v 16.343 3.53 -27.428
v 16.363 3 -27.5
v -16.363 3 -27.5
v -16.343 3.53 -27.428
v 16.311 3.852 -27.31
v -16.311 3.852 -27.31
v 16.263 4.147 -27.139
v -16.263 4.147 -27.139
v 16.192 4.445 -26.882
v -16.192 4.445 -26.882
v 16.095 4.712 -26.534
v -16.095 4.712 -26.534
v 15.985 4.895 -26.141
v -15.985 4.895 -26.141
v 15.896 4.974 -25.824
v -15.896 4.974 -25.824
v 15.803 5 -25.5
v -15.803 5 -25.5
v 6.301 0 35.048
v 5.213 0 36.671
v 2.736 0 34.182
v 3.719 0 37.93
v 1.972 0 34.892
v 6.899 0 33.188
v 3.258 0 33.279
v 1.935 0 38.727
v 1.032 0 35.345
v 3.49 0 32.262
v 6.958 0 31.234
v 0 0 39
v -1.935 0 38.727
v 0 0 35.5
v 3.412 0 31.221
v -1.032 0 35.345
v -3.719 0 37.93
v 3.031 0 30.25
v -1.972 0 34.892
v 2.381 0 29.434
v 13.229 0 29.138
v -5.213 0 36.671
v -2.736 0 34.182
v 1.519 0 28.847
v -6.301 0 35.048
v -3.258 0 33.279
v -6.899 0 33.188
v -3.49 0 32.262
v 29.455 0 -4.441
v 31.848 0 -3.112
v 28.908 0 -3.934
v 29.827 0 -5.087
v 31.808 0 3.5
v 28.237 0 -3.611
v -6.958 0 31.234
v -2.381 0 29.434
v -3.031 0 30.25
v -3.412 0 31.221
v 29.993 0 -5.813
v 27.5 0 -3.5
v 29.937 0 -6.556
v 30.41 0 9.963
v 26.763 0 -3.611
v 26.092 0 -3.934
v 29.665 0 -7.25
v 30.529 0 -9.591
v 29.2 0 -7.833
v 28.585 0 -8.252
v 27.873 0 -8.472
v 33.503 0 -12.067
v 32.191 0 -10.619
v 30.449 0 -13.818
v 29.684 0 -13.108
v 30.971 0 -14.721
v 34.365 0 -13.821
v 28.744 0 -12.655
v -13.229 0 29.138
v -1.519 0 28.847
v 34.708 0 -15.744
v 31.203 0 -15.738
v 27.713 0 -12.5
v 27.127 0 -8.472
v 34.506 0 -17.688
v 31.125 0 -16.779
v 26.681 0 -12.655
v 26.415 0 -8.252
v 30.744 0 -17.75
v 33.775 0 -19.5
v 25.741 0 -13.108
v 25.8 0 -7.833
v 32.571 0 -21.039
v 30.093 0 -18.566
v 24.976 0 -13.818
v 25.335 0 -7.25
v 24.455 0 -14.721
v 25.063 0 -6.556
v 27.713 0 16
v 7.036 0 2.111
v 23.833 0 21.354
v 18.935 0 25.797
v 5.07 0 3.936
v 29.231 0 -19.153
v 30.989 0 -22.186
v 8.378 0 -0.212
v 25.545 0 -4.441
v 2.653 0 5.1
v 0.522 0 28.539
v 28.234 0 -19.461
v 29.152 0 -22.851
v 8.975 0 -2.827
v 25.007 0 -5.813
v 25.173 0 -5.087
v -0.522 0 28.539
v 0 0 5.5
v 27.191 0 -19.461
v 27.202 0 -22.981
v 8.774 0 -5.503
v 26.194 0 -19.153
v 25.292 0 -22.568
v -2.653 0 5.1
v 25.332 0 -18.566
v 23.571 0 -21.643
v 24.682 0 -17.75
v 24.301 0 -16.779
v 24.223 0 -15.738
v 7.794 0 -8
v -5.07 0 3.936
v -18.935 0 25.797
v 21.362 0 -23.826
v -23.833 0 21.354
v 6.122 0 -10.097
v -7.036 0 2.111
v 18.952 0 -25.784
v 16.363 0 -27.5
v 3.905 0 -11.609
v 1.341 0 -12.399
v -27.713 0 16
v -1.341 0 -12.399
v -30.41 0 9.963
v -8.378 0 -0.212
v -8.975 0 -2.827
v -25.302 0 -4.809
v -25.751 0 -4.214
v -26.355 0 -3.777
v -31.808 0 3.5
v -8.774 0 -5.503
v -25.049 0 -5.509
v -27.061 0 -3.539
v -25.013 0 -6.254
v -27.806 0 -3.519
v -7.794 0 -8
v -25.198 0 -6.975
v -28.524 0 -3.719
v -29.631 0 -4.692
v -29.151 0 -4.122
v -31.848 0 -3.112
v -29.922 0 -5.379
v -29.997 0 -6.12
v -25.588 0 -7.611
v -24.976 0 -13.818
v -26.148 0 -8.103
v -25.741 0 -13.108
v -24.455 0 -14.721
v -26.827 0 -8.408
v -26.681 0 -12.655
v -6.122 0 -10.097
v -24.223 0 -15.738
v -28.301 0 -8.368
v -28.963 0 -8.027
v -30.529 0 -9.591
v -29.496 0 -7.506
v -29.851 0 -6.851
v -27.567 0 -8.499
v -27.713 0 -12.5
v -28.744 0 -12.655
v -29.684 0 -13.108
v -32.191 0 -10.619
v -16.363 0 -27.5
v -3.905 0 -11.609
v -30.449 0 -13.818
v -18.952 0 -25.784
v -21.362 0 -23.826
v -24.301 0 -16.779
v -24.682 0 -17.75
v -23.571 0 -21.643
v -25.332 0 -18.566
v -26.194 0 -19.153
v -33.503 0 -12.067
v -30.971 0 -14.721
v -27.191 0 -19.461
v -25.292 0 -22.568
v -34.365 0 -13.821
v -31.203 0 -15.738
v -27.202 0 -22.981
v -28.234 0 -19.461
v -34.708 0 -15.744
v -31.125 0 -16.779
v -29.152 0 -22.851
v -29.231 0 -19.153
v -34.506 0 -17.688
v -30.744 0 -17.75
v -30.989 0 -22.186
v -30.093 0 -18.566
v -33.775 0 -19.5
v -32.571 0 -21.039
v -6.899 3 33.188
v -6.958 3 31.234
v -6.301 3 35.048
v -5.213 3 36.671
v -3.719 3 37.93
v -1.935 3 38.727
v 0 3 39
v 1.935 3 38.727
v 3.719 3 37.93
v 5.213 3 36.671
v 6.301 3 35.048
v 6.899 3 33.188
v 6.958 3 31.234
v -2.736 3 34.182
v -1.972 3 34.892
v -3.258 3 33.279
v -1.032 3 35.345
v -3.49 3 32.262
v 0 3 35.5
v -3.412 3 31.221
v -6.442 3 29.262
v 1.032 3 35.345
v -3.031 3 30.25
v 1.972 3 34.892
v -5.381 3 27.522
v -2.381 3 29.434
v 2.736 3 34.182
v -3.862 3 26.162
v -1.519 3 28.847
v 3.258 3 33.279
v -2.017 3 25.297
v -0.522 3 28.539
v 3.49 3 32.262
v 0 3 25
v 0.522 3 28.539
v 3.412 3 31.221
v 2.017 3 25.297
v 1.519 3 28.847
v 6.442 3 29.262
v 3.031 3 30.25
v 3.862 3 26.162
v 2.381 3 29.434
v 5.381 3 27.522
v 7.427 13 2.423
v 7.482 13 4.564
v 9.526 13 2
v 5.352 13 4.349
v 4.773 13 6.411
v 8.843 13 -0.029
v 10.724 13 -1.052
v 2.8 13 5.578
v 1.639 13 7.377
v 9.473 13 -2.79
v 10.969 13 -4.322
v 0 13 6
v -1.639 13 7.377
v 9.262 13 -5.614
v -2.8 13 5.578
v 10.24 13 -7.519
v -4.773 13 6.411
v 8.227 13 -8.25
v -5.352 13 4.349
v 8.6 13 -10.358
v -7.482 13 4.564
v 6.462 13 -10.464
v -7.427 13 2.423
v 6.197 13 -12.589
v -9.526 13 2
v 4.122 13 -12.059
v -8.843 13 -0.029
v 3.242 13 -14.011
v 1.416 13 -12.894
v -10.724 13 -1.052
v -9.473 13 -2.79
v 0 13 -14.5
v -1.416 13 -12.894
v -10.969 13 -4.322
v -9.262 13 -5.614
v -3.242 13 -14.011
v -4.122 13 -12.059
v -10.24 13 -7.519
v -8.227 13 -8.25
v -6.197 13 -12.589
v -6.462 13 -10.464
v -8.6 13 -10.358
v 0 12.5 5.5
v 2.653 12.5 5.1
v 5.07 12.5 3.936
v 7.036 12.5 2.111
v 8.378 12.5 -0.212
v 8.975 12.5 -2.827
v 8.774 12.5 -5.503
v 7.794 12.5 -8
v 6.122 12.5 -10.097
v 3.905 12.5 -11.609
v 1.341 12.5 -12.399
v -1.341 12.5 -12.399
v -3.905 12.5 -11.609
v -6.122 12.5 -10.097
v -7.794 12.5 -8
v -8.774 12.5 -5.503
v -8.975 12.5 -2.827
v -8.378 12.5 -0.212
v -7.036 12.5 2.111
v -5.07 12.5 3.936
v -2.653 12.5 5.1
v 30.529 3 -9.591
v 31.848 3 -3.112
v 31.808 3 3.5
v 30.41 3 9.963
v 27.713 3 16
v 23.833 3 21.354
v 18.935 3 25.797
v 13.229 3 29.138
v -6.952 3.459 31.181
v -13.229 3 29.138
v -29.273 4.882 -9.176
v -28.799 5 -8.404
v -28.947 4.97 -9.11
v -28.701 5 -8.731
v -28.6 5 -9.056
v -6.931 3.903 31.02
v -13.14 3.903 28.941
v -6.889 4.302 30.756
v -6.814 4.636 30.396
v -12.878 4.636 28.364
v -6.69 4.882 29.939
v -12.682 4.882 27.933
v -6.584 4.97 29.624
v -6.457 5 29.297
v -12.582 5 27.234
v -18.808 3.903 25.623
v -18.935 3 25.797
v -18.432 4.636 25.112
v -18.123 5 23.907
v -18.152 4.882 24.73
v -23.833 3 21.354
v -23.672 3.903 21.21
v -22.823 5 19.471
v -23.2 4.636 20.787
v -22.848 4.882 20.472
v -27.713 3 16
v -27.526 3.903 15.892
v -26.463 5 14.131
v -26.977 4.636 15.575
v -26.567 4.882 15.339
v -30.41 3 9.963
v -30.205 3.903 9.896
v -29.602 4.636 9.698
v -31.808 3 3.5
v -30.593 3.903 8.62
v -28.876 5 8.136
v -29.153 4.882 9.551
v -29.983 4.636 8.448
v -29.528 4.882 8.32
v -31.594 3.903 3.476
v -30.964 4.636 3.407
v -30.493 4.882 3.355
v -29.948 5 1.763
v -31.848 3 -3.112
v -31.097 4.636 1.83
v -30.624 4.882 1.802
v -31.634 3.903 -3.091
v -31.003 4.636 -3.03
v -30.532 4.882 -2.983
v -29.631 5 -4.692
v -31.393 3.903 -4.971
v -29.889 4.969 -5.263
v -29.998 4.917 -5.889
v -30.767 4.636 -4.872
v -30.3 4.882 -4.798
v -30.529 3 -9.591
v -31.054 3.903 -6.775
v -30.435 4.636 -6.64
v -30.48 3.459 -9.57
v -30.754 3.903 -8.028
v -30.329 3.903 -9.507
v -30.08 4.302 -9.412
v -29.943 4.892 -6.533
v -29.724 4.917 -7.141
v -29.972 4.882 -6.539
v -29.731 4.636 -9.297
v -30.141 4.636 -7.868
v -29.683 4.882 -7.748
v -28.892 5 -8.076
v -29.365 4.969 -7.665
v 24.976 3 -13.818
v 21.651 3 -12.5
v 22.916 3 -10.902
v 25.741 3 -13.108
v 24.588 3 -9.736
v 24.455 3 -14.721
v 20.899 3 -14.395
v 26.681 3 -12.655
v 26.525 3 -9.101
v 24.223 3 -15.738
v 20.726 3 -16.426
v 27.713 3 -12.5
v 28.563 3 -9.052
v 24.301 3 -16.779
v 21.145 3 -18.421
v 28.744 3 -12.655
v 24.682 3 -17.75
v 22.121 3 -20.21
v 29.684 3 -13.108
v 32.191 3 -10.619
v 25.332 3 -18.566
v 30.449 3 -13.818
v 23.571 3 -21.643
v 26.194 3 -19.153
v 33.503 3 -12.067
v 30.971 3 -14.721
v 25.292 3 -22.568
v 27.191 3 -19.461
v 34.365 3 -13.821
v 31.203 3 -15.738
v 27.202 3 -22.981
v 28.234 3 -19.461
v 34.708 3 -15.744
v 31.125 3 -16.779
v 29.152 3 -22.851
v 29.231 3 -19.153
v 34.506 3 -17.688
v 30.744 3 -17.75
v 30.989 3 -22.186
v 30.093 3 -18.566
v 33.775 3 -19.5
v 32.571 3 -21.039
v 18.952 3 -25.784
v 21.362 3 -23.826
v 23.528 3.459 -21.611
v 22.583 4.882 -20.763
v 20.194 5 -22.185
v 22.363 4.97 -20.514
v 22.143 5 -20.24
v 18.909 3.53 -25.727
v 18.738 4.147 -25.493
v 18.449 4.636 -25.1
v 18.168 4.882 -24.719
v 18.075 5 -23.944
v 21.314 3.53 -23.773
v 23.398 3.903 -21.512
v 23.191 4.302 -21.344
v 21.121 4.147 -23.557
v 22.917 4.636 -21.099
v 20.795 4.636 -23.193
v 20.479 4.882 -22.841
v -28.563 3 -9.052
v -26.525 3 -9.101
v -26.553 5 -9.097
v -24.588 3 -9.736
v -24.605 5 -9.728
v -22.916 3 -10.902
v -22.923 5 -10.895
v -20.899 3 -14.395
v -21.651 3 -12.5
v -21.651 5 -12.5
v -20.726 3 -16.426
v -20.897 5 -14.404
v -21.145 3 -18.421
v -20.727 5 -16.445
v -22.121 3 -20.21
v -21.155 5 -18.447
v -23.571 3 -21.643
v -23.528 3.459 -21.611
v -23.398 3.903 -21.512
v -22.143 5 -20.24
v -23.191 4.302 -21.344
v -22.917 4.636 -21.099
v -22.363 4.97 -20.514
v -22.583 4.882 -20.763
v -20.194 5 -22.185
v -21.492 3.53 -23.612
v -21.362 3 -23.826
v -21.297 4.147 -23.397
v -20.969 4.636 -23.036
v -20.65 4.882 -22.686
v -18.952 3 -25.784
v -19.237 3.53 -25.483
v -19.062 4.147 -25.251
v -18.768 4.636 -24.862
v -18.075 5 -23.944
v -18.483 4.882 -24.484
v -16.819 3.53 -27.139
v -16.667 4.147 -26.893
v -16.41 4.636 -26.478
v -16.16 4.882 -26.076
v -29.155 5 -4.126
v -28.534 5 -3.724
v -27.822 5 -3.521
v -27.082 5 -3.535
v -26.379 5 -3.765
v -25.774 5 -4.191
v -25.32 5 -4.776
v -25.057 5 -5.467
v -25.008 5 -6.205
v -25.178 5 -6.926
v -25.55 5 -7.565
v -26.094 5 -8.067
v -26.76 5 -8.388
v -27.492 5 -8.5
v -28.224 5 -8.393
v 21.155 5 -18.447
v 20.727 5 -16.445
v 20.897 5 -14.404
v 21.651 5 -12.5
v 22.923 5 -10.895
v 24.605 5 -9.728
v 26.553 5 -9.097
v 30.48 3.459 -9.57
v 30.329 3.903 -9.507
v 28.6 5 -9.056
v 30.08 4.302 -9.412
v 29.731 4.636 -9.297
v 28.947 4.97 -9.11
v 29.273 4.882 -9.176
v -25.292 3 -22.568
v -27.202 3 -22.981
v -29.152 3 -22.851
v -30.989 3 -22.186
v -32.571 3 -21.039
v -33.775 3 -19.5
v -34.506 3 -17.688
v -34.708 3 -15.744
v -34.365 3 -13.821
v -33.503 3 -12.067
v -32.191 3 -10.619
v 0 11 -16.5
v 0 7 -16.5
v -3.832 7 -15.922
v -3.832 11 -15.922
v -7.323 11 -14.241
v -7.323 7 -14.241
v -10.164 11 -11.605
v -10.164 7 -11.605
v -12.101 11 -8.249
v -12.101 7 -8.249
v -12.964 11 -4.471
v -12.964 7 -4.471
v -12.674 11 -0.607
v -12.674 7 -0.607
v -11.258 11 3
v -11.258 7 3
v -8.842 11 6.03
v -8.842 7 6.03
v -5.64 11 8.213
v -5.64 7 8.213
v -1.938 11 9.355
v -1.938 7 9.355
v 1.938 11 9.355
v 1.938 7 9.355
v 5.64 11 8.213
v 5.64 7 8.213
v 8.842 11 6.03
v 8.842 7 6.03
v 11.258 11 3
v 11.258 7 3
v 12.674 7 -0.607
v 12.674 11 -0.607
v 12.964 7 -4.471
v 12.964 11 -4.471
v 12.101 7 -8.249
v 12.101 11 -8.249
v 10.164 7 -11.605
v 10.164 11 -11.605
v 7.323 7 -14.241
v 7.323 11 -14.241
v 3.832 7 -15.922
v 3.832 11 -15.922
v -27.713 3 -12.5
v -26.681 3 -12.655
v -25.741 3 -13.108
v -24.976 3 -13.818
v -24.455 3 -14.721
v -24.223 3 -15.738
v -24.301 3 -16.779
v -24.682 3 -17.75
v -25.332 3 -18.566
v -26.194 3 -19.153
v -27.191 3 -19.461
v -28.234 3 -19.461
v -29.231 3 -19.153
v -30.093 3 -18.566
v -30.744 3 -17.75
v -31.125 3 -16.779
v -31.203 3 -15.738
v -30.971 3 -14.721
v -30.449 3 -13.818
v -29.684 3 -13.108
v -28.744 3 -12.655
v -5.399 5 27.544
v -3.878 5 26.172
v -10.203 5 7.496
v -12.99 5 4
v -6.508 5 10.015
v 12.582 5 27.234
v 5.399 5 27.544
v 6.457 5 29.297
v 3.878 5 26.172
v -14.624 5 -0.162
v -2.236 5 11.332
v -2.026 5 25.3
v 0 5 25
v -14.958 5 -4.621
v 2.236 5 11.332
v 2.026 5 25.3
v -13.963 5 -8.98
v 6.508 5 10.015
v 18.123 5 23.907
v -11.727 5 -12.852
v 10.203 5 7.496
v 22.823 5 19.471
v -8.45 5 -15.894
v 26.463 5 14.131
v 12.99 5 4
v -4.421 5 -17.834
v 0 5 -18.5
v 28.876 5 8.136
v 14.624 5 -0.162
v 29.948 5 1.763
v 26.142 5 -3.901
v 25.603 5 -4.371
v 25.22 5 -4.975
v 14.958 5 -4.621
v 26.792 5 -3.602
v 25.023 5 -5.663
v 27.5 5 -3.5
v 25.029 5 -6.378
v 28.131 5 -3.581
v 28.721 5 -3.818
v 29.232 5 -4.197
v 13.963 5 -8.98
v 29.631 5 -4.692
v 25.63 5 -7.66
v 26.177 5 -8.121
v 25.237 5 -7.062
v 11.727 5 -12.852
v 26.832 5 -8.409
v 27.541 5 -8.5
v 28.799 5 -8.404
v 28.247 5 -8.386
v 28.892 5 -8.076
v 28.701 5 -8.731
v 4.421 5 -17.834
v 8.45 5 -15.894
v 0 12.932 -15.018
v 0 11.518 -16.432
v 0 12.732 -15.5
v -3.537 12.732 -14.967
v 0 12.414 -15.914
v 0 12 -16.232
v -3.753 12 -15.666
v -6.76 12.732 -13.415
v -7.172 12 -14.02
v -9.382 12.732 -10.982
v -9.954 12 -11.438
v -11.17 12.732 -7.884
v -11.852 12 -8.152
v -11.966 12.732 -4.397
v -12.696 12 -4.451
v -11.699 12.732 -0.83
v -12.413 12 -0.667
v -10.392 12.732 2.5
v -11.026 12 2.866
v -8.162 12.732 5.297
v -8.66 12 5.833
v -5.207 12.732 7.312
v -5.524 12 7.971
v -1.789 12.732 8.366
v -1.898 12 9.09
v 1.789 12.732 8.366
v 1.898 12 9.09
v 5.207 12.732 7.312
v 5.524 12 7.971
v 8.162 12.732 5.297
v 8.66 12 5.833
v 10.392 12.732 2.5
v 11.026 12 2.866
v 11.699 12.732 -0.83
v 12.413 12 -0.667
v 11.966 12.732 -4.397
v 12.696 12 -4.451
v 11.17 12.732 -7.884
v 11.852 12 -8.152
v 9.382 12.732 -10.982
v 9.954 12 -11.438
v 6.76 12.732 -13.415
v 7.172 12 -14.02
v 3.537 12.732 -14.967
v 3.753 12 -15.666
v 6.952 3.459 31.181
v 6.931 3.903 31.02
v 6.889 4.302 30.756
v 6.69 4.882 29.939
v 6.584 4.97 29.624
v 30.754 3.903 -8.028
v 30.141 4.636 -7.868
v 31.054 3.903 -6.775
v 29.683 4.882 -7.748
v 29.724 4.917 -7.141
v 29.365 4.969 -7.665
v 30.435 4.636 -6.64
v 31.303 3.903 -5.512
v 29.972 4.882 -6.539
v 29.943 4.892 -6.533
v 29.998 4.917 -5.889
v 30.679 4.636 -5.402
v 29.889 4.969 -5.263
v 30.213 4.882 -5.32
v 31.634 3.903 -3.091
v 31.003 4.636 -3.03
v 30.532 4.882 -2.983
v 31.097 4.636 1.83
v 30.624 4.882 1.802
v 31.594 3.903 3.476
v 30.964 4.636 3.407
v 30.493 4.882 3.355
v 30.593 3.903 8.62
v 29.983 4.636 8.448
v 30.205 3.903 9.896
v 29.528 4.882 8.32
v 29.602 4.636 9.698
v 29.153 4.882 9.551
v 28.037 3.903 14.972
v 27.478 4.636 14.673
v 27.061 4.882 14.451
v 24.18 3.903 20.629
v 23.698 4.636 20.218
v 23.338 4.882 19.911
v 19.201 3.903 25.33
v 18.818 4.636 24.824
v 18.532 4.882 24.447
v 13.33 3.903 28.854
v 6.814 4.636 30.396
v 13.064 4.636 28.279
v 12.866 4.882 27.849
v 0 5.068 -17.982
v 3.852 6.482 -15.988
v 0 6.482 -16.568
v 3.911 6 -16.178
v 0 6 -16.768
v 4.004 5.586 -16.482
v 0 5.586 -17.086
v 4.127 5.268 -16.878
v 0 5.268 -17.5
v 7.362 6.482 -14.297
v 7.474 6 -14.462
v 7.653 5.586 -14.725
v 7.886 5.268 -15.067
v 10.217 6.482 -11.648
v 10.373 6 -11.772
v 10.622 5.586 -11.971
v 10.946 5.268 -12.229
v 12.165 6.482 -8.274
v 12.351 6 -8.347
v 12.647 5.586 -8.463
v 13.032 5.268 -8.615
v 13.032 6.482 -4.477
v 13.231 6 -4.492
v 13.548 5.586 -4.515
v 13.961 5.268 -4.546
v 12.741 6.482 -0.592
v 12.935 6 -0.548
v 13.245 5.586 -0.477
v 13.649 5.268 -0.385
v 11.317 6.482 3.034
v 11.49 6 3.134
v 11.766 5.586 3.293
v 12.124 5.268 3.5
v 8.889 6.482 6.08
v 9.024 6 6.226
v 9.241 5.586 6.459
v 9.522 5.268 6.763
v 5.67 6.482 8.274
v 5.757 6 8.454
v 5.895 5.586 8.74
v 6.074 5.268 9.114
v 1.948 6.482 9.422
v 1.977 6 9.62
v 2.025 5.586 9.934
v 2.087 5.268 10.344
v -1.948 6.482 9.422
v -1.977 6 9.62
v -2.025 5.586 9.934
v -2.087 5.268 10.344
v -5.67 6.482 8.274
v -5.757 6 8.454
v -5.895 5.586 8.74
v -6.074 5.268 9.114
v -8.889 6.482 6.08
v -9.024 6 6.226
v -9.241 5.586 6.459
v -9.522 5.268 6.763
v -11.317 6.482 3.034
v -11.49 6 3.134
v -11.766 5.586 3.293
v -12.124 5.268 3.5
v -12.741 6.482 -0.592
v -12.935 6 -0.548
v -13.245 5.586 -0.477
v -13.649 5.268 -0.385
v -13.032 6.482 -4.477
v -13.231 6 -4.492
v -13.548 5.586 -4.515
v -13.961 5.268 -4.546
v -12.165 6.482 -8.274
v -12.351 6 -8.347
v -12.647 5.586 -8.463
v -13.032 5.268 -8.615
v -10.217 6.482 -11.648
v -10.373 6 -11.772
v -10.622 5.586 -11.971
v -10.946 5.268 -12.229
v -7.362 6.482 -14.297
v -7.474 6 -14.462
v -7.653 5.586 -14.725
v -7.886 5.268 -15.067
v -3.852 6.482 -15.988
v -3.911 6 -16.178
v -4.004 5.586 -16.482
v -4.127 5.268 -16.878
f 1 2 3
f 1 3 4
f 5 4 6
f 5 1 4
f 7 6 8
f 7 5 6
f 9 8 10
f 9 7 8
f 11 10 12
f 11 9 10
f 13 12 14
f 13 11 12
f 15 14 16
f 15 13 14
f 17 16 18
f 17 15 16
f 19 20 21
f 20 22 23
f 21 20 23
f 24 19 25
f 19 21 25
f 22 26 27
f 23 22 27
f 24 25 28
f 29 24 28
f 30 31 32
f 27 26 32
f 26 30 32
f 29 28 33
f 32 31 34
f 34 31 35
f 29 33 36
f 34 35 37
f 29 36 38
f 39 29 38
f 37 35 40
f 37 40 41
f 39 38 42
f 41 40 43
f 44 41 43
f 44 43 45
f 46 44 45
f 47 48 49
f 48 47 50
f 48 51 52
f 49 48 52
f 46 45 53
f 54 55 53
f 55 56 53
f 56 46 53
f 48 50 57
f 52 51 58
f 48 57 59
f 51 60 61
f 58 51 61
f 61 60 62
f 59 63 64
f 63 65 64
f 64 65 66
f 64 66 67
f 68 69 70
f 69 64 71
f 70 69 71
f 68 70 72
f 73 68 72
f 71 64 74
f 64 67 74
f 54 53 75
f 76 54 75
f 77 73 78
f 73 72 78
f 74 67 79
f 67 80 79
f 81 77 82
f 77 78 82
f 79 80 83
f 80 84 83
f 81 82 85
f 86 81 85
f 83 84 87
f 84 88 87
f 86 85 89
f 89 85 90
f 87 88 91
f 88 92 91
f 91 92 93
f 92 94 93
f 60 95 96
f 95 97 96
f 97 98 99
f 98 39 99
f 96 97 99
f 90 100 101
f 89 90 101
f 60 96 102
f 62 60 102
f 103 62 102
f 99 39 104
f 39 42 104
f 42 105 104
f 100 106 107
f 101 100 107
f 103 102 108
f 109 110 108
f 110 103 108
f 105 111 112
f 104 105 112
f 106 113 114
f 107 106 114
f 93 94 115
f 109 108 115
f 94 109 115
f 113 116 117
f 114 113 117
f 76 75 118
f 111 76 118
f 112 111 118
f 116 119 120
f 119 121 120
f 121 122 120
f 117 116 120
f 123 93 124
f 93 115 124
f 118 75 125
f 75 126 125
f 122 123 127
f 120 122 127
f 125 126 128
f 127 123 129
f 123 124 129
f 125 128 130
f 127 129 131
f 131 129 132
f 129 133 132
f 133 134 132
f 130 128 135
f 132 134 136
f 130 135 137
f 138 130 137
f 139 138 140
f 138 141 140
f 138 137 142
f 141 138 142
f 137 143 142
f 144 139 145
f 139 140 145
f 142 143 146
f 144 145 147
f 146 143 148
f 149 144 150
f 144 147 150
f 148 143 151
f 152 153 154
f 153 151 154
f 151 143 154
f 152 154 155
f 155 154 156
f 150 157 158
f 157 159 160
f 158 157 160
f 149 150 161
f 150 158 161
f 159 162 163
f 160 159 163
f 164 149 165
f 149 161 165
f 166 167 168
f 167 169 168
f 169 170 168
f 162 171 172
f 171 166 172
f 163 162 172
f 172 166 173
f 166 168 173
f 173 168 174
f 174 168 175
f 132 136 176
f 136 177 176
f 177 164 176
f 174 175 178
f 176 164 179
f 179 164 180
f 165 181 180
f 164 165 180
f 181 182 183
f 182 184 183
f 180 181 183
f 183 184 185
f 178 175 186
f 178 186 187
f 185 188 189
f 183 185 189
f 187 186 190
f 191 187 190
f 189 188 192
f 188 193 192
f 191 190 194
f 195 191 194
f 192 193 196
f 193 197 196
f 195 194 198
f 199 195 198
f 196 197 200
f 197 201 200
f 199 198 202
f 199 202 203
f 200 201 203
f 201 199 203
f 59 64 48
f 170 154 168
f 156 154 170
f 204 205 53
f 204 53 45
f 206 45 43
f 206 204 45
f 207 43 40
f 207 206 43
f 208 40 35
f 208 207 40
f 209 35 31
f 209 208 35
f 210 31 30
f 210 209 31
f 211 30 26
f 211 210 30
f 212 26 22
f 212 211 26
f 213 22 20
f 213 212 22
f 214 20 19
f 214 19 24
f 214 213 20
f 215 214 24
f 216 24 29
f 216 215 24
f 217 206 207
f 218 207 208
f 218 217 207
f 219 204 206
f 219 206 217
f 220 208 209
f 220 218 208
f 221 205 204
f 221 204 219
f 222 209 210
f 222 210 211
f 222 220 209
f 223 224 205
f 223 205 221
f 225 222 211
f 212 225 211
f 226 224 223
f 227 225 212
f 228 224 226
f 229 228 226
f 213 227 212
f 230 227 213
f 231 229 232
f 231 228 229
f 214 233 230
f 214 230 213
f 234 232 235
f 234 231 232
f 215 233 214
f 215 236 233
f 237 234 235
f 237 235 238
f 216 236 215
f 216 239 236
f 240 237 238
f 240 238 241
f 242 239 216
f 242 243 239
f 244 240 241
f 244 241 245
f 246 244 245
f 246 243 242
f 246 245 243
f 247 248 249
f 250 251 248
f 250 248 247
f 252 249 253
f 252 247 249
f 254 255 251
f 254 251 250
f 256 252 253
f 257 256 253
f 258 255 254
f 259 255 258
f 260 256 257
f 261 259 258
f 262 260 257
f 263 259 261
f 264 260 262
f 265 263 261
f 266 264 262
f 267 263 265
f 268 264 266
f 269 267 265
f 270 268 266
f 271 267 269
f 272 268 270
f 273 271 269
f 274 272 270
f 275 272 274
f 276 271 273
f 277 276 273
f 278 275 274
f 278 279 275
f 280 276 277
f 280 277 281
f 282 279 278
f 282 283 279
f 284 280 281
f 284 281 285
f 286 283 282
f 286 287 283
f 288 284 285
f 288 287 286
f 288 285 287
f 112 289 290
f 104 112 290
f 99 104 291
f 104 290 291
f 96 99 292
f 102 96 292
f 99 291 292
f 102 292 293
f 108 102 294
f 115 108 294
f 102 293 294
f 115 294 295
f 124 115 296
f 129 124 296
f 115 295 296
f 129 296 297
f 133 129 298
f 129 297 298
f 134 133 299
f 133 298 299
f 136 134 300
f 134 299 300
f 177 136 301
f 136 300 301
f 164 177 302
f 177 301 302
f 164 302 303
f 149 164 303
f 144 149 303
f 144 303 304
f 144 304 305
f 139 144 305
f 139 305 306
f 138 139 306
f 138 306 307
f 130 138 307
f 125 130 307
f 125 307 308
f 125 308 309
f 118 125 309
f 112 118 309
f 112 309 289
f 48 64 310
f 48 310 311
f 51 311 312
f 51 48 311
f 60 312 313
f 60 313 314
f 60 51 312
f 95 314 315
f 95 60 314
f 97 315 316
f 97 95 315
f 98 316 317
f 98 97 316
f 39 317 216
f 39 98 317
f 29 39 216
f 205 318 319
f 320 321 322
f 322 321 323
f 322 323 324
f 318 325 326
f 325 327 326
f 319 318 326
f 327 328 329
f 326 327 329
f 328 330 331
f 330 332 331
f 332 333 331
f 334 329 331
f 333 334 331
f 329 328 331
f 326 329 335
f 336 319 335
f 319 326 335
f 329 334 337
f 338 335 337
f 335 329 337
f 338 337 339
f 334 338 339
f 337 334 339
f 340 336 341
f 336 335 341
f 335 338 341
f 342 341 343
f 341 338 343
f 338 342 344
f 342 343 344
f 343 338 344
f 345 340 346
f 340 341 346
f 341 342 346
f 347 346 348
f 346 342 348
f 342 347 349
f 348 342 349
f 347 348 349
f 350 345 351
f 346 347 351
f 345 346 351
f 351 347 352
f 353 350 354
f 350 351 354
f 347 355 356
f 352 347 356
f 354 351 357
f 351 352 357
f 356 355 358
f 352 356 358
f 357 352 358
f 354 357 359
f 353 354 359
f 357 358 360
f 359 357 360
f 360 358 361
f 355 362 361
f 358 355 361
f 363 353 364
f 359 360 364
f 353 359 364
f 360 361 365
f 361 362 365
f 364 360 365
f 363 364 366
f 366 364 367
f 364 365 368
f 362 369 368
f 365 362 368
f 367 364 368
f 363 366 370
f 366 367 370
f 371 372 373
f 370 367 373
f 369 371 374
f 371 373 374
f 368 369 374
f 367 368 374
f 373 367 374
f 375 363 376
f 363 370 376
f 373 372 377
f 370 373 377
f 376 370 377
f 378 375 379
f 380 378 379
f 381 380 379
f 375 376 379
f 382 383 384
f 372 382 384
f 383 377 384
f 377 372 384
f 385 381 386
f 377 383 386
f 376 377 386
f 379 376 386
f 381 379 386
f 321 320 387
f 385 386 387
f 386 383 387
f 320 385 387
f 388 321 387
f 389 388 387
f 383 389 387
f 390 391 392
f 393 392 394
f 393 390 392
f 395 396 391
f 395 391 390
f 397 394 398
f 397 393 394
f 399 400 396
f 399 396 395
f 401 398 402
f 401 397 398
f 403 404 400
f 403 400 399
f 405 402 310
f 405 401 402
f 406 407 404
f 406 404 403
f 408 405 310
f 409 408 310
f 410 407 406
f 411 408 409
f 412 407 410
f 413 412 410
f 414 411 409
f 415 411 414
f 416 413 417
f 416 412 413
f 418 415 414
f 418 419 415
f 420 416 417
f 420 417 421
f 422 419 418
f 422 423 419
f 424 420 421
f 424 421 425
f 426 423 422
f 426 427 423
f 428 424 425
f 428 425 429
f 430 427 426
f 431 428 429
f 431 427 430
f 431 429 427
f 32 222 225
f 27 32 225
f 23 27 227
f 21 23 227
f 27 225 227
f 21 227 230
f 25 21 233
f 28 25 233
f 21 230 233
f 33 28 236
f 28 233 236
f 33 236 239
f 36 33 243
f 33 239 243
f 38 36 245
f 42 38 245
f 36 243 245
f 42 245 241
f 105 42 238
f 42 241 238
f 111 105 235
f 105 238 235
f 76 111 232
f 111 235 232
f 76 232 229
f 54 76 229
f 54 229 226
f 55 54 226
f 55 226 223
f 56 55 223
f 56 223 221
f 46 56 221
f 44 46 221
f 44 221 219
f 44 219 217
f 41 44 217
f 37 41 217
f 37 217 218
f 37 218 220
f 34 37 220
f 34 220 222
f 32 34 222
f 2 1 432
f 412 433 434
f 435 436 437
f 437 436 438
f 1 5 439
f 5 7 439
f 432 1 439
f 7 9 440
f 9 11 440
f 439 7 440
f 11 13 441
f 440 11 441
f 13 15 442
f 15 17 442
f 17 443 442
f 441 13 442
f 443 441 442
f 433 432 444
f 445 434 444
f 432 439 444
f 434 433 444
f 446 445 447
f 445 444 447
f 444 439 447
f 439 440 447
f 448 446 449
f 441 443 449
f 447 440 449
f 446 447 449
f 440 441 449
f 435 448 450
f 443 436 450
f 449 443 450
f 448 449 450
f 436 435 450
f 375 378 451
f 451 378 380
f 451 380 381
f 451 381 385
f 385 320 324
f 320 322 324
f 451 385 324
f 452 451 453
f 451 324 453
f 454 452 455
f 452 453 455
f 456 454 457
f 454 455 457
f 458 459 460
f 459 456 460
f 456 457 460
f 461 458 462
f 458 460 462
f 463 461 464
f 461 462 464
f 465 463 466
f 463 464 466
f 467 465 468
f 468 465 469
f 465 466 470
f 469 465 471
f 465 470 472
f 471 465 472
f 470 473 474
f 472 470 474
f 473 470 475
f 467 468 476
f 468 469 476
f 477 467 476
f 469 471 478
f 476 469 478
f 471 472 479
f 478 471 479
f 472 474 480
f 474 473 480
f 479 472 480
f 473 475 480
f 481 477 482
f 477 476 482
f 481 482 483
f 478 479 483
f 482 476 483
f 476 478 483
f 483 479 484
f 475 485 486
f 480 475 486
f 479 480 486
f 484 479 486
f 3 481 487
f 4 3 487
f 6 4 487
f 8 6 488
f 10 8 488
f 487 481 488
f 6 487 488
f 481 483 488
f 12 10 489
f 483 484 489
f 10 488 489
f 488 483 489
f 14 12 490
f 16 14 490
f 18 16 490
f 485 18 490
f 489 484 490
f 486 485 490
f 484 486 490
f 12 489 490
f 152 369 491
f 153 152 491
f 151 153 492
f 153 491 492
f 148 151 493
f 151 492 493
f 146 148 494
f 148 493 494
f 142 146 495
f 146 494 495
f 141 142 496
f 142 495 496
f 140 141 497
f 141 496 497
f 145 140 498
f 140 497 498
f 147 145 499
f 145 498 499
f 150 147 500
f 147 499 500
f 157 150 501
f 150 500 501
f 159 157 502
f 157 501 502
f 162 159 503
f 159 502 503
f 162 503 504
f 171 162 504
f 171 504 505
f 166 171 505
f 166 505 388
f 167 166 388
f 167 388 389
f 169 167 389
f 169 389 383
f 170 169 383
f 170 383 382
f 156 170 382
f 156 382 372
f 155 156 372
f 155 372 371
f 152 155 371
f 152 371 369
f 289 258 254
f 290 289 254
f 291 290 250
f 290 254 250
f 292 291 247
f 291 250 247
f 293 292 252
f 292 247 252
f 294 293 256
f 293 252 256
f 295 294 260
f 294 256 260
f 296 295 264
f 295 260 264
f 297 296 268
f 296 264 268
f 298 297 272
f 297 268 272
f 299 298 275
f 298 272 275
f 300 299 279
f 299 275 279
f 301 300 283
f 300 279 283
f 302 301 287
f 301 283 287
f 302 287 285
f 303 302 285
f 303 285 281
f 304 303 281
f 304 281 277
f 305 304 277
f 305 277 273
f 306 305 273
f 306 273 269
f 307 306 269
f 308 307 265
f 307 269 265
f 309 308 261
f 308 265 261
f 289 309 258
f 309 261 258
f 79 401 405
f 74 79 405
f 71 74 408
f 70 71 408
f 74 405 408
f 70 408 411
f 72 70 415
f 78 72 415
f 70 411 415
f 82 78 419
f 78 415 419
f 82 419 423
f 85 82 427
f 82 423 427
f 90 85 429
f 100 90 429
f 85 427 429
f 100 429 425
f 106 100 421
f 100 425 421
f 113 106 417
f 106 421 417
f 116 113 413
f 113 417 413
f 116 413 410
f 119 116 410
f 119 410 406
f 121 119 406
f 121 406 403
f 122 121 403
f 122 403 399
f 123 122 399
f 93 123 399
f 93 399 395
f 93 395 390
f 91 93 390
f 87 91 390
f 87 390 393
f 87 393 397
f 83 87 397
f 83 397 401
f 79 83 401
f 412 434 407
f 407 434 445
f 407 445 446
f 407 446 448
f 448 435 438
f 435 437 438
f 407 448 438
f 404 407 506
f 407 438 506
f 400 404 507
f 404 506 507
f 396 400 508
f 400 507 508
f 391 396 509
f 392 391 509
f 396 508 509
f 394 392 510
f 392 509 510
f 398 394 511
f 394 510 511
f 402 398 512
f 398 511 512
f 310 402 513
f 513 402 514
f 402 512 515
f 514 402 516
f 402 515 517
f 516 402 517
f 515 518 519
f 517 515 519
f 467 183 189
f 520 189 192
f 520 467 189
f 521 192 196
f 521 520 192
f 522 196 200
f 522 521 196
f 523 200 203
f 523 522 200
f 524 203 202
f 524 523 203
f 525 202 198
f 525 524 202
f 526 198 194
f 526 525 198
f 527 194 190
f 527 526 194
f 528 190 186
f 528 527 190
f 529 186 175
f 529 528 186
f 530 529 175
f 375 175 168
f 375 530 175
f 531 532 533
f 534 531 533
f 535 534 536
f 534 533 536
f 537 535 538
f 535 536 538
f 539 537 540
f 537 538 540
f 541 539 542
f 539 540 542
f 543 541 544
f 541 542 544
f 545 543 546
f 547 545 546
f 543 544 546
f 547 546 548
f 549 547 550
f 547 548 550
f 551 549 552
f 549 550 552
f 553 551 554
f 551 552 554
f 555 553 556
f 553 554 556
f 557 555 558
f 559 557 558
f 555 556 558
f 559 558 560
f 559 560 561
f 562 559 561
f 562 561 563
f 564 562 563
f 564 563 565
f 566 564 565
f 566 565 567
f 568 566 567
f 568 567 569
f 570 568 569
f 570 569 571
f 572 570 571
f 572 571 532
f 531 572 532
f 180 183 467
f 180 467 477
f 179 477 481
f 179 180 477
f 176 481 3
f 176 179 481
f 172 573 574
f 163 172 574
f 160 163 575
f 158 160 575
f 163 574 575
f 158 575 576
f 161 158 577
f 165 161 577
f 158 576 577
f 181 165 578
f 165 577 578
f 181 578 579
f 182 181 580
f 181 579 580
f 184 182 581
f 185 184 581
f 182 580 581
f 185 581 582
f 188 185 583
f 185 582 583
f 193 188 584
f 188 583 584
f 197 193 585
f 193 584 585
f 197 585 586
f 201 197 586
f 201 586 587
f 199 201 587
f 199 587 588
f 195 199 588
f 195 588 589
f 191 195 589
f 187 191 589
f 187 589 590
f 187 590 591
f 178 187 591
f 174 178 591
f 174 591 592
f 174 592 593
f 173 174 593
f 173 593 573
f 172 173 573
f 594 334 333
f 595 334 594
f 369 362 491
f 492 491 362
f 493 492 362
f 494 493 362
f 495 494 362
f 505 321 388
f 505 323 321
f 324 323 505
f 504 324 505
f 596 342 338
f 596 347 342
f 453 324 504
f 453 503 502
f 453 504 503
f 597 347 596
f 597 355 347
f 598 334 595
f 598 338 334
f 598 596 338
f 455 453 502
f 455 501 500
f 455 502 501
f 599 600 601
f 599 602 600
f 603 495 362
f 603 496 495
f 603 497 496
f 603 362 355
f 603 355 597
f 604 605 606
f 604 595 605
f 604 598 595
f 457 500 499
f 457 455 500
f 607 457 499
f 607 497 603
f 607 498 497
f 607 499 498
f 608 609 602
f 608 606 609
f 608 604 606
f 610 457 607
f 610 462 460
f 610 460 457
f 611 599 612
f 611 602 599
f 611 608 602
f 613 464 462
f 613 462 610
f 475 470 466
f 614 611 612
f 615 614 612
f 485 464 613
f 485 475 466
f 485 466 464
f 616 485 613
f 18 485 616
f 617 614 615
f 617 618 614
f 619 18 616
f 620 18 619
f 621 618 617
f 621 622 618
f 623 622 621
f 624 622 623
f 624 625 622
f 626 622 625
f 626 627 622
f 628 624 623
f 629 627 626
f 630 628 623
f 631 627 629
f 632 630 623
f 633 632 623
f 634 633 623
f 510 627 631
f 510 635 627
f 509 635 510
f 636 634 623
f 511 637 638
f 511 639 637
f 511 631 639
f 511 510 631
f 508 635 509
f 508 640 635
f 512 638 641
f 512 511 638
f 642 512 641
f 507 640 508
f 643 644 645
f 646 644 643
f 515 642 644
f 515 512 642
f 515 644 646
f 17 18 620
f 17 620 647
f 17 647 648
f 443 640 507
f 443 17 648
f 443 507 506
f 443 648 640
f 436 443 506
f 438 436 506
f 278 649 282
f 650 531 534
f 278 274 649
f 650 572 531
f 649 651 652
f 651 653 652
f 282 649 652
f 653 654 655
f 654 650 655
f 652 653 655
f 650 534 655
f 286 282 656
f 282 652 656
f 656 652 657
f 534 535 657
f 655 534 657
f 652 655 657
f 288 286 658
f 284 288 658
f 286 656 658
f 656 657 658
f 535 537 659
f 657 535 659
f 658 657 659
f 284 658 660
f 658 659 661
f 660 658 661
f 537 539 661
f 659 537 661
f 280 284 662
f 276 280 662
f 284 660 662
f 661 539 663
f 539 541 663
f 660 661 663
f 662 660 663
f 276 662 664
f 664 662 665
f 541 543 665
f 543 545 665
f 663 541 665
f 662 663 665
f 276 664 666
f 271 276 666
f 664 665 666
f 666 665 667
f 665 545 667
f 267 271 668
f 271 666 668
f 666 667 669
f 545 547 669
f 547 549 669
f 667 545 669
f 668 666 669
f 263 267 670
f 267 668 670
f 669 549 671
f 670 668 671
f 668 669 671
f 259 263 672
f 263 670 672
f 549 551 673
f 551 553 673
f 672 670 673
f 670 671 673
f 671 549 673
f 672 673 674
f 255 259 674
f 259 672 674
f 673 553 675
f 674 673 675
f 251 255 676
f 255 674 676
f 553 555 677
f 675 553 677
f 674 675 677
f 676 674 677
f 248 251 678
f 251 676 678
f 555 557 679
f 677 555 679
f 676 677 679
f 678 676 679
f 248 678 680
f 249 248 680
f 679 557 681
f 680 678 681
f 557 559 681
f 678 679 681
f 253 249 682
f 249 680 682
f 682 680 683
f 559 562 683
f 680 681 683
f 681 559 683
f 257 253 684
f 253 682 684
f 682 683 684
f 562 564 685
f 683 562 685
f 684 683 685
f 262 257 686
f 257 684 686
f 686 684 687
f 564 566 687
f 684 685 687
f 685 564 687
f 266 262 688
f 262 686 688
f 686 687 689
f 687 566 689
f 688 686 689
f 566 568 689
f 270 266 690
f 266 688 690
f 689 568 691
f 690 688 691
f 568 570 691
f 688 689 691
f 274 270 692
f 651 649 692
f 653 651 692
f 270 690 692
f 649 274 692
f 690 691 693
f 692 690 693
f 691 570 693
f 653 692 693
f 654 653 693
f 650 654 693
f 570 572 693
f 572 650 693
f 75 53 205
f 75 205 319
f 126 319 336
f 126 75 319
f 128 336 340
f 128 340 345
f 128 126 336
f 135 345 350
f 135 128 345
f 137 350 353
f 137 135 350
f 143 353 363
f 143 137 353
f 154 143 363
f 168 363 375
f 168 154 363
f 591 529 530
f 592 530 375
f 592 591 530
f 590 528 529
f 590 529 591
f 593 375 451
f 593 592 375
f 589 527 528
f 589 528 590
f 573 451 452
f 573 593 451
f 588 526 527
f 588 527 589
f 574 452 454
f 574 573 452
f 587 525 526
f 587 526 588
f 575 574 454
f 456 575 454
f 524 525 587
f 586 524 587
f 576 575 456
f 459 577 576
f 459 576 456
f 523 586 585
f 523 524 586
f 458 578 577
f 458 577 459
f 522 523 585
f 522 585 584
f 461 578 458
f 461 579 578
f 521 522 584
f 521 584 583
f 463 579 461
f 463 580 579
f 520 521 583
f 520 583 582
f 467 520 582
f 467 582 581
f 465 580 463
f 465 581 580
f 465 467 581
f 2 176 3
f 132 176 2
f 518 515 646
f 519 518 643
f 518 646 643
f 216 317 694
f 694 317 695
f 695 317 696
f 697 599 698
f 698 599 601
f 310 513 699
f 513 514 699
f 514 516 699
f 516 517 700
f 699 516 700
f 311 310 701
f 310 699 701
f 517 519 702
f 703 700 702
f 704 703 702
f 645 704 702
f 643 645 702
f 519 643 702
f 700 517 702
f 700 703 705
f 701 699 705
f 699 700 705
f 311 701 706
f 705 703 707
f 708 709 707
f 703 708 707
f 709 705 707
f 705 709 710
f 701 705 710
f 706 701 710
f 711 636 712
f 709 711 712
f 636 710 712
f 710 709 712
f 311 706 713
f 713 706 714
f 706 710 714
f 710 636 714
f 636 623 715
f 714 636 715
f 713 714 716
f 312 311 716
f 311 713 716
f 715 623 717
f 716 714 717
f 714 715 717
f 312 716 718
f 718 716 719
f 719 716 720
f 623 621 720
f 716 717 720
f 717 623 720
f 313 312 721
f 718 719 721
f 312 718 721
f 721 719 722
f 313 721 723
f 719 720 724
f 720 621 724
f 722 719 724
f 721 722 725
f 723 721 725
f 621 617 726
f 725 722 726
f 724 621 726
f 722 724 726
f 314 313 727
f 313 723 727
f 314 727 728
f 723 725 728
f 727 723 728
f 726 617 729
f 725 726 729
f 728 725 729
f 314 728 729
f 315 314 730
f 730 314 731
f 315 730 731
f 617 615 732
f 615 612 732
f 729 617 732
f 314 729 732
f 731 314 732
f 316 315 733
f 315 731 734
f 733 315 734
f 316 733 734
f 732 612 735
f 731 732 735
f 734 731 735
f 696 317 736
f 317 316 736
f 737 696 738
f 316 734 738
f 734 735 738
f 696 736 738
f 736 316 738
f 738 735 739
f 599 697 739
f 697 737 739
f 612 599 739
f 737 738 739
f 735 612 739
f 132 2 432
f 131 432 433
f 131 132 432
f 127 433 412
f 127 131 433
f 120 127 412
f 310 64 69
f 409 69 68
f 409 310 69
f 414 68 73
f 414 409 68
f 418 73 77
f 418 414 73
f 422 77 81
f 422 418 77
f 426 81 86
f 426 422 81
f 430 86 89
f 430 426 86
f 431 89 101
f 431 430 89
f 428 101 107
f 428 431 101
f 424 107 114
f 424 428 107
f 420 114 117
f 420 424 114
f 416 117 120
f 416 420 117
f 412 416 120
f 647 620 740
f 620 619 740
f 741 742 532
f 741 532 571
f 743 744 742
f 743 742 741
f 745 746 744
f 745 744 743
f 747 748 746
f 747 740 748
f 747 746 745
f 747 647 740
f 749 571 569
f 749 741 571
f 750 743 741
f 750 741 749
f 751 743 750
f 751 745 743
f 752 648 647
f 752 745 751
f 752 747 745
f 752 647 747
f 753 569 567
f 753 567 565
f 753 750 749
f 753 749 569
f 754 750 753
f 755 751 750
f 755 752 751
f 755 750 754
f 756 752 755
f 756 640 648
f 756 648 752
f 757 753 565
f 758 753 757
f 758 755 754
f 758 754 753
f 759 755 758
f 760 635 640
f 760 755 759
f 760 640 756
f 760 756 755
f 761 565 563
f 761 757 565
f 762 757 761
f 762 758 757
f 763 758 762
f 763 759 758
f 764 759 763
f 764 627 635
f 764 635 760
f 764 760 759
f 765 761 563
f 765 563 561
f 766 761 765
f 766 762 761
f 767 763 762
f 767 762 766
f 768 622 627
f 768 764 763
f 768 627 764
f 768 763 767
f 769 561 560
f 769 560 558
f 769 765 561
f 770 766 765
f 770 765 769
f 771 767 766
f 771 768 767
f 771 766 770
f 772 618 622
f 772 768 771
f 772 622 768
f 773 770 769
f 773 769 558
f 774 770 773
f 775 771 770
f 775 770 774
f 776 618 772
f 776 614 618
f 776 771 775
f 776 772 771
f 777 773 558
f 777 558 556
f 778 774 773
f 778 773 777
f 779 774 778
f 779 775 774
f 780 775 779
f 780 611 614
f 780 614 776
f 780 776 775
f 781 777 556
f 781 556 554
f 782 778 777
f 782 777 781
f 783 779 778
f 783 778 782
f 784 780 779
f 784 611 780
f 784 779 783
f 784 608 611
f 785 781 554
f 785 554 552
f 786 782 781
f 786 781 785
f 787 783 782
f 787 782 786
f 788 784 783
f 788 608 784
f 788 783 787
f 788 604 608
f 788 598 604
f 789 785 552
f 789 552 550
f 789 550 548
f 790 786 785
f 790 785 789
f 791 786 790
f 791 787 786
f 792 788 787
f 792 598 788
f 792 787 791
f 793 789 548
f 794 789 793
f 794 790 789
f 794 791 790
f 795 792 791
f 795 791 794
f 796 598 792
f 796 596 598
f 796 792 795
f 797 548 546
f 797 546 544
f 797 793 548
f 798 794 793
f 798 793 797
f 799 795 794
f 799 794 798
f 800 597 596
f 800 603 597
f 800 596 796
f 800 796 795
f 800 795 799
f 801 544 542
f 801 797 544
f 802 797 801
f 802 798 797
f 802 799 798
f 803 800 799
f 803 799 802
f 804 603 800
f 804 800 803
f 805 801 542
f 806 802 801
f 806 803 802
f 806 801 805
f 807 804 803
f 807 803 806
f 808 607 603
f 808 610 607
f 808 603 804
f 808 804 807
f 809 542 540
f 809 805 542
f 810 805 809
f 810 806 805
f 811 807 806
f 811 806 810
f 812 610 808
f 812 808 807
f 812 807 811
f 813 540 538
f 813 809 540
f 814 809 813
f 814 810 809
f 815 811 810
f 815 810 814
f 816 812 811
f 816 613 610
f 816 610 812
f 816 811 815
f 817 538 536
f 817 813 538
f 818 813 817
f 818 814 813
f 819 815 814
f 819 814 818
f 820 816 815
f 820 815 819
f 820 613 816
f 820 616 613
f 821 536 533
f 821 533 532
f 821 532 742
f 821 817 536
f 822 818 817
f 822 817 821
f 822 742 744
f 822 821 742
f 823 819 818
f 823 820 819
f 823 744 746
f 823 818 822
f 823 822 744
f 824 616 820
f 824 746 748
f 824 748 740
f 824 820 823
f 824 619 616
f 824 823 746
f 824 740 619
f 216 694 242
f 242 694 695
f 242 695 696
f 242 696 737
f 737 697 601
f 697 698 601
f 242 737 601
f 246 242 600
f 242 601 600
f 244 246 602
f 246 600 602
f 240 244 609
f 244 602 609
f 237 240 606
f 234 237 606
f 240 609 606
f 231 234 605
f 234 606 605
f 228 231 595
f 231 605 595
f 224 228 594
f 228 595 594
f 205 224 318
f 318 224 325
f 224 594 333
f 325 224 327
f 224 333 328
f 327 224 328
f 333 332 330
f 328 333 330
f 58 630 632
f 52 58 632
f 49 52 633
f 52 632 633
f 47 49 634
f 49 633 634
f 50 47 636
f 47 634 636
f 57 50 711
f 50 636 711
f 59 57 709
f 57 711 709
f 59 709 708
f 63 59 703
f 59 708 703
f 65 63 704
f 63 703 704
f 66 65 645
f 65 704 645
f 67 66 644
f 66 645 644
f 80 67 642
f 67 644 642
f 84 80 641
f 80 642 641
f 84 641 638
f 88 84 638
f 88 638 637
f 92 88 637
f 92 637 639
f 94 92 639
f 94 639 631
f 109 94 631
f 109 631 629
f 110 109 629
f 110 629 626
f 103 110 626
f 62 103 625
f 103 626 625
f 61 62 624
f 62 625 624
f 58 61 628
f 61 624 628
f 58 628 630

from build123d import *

# Parameters (mm, degrees)
EXTRUDE_1_DEPTH     = 5
FILLET_2_R          = 2
SKETCH_2_R          = 7
EXTRUDE_2_DEPTH     = 5
SKETCH_2_2_R        = 7
CUT_EXTRUDE_1_DEPTH = 2
SKETCH_3_R          = 3.5
CUT_EXTRUDE_2_DEPTH = 53.297030326
SKETCH_4_R          = 13
EXTRUDE_3_DEPTH     = 13
SKETCH_5_R          = 9
CUT_EXTRUDE_3_DEPTH = 54.8050126
SKETCH_6_R          = 2.5
CUT_EXTRUDE_4_DEPTH = 53.820255404
CHAMFER_1_SIZE      = 0.5
FILLET_1_R          = 2


with BuildPart() as part:
    # 草图1 → 凸台-拉伸1 (new body)
    with BuildSketch(Plane(origin=(0, 0, 0), x_dir=(1, 0, 0), z_dir=(0, 1, 0))):
        with BuildLine():
            Line((-16.363068172, 27.5), (16.363068172, 27.5))
            ThreePointArc((16.363068172, 27.5), (0, -32), (-16.363068172, 27.5))
        make_face()
    extrude(amount=EXTRUDE_1_DEPTH)

    # 圆角2
    fillet_2_edges = [part.edges().sort_by_distance(p)[0] for p in [
        (0, 5, 32),
        (0, 5, -27.5),
    ]]
    fillet(fillet_2_edges, radius=FILLET_2_R)

    # 草图2 → 凸台-拉伸2 (add)
    with BuildSketch(Plane(origin=(0, 5, 0), x_dir=(1, 0, 0), z_dir=(0, 1, 0))):
        with Locations((0, -32)):
            Circle(SKETCH_2_R)
        with Locations((-27.712812921, 16)):
            Circle(SKETCH_2_R)
        with Locations((27.712812921, 16)):
            Circle(SKETCH_2_R)
    extrude(amount=-EXTRUDE_2_DEPTH)

    # 草图2<2> → 切除-拉伸1 (cut)
    with BuildSketch(Plane(origin=(0, 5, 0), x_dir=(1, 0, 0), z_dir=(0, 1, 0))):
        with Locations((0, -32)):
            Circle(SKETCH_2_2_R)
        with Locations((-27.712812921, 16)):
            Circle(SKETCH_2_2_R)
        with Locations((27.712812921, 16)):
            Circle(SKETCH_2_2_R)
    extrude(amount=-CUT_EXTRUDE_1_DEPTH, mode=Mode.SUBTRACT)

    # 草图3 → 切除-拉伸2 (cut, through all)
    with BuildSketch(Plane(origin=(0, 3, 0), x_dir=(1, 0, 0), z_dir=(0, 1, 0))):
        with Locations((0, -32)):
            Circle(SKETCH_3_R)
        with Locations((-27.712812921, 16)):
            Circle(SKETCH_3_R)
        with Locations((27.712812921, 16)):
            Circle(SKETCH_3_R)
    extrude(amount=-CUT_EXTRUDE_2_DEPTH, mode=Mode.SUBTRACT)

    # 草图4 → 凸台-拉伸3 (add)
    with BuildSketch(Plane(origin=(0, 0, 0), x_dir=(1, 0, 0), z_dir=(0, 1, 0))):
        with Locations((0, 3.5)):
            Circle(SKETCH_4_R)
    extrude(amount=EXTRUDE_3_DEPTH)

    # 草图5 → 切除-拉伸3 (cut, through all)
    with BuildSketch(Plane(origin=(0, 13, 0), x_dir=(1, 0, 0), z_dir=(0, 1, 0))):
        with Locations((0, 3.5)):
            Circle(SKETCH_5_R)
    extrude(amount=-CUT_EXTRUDE_3_DEPTH, mode=Mode.SUBTRACT)

    # 草图6 → 切除-拉伸4 (cut, through all)
    with BuildSketch(Plane(origin=(0, 5, 0), x_dir=(1, 0, 0), z_dir=(0, 1, 0))):
        with Locations((27.5, 6)):
            Circle(SKETCH_6_R)
        with Locations((-27.5, 6)):
            Circle(SKETCH_6_R)
    extrude(amount=-CUT_EXTRUDE_4_DEPTH, mode=Mode.SUBTRACT)

    # 倒角1
    chamfer_1_edges = [part.edges().sort_by_distance(p)[0] for p in [
        (-9, 13, -3.5),
    ]]
    chamfer(chamfer_1_edges, length=CHAMFER_1_SIZE)

    # 圆角1
    fillet_1_edges = [part.edges().sort_by_distance(p)[0] for p in [
        (-13, 5, -3.5),
        (-13, 13, -3.5),
    ]]
    fillet(fillet_1_edges, radius=FILLET_1_R)


solid = part.part
